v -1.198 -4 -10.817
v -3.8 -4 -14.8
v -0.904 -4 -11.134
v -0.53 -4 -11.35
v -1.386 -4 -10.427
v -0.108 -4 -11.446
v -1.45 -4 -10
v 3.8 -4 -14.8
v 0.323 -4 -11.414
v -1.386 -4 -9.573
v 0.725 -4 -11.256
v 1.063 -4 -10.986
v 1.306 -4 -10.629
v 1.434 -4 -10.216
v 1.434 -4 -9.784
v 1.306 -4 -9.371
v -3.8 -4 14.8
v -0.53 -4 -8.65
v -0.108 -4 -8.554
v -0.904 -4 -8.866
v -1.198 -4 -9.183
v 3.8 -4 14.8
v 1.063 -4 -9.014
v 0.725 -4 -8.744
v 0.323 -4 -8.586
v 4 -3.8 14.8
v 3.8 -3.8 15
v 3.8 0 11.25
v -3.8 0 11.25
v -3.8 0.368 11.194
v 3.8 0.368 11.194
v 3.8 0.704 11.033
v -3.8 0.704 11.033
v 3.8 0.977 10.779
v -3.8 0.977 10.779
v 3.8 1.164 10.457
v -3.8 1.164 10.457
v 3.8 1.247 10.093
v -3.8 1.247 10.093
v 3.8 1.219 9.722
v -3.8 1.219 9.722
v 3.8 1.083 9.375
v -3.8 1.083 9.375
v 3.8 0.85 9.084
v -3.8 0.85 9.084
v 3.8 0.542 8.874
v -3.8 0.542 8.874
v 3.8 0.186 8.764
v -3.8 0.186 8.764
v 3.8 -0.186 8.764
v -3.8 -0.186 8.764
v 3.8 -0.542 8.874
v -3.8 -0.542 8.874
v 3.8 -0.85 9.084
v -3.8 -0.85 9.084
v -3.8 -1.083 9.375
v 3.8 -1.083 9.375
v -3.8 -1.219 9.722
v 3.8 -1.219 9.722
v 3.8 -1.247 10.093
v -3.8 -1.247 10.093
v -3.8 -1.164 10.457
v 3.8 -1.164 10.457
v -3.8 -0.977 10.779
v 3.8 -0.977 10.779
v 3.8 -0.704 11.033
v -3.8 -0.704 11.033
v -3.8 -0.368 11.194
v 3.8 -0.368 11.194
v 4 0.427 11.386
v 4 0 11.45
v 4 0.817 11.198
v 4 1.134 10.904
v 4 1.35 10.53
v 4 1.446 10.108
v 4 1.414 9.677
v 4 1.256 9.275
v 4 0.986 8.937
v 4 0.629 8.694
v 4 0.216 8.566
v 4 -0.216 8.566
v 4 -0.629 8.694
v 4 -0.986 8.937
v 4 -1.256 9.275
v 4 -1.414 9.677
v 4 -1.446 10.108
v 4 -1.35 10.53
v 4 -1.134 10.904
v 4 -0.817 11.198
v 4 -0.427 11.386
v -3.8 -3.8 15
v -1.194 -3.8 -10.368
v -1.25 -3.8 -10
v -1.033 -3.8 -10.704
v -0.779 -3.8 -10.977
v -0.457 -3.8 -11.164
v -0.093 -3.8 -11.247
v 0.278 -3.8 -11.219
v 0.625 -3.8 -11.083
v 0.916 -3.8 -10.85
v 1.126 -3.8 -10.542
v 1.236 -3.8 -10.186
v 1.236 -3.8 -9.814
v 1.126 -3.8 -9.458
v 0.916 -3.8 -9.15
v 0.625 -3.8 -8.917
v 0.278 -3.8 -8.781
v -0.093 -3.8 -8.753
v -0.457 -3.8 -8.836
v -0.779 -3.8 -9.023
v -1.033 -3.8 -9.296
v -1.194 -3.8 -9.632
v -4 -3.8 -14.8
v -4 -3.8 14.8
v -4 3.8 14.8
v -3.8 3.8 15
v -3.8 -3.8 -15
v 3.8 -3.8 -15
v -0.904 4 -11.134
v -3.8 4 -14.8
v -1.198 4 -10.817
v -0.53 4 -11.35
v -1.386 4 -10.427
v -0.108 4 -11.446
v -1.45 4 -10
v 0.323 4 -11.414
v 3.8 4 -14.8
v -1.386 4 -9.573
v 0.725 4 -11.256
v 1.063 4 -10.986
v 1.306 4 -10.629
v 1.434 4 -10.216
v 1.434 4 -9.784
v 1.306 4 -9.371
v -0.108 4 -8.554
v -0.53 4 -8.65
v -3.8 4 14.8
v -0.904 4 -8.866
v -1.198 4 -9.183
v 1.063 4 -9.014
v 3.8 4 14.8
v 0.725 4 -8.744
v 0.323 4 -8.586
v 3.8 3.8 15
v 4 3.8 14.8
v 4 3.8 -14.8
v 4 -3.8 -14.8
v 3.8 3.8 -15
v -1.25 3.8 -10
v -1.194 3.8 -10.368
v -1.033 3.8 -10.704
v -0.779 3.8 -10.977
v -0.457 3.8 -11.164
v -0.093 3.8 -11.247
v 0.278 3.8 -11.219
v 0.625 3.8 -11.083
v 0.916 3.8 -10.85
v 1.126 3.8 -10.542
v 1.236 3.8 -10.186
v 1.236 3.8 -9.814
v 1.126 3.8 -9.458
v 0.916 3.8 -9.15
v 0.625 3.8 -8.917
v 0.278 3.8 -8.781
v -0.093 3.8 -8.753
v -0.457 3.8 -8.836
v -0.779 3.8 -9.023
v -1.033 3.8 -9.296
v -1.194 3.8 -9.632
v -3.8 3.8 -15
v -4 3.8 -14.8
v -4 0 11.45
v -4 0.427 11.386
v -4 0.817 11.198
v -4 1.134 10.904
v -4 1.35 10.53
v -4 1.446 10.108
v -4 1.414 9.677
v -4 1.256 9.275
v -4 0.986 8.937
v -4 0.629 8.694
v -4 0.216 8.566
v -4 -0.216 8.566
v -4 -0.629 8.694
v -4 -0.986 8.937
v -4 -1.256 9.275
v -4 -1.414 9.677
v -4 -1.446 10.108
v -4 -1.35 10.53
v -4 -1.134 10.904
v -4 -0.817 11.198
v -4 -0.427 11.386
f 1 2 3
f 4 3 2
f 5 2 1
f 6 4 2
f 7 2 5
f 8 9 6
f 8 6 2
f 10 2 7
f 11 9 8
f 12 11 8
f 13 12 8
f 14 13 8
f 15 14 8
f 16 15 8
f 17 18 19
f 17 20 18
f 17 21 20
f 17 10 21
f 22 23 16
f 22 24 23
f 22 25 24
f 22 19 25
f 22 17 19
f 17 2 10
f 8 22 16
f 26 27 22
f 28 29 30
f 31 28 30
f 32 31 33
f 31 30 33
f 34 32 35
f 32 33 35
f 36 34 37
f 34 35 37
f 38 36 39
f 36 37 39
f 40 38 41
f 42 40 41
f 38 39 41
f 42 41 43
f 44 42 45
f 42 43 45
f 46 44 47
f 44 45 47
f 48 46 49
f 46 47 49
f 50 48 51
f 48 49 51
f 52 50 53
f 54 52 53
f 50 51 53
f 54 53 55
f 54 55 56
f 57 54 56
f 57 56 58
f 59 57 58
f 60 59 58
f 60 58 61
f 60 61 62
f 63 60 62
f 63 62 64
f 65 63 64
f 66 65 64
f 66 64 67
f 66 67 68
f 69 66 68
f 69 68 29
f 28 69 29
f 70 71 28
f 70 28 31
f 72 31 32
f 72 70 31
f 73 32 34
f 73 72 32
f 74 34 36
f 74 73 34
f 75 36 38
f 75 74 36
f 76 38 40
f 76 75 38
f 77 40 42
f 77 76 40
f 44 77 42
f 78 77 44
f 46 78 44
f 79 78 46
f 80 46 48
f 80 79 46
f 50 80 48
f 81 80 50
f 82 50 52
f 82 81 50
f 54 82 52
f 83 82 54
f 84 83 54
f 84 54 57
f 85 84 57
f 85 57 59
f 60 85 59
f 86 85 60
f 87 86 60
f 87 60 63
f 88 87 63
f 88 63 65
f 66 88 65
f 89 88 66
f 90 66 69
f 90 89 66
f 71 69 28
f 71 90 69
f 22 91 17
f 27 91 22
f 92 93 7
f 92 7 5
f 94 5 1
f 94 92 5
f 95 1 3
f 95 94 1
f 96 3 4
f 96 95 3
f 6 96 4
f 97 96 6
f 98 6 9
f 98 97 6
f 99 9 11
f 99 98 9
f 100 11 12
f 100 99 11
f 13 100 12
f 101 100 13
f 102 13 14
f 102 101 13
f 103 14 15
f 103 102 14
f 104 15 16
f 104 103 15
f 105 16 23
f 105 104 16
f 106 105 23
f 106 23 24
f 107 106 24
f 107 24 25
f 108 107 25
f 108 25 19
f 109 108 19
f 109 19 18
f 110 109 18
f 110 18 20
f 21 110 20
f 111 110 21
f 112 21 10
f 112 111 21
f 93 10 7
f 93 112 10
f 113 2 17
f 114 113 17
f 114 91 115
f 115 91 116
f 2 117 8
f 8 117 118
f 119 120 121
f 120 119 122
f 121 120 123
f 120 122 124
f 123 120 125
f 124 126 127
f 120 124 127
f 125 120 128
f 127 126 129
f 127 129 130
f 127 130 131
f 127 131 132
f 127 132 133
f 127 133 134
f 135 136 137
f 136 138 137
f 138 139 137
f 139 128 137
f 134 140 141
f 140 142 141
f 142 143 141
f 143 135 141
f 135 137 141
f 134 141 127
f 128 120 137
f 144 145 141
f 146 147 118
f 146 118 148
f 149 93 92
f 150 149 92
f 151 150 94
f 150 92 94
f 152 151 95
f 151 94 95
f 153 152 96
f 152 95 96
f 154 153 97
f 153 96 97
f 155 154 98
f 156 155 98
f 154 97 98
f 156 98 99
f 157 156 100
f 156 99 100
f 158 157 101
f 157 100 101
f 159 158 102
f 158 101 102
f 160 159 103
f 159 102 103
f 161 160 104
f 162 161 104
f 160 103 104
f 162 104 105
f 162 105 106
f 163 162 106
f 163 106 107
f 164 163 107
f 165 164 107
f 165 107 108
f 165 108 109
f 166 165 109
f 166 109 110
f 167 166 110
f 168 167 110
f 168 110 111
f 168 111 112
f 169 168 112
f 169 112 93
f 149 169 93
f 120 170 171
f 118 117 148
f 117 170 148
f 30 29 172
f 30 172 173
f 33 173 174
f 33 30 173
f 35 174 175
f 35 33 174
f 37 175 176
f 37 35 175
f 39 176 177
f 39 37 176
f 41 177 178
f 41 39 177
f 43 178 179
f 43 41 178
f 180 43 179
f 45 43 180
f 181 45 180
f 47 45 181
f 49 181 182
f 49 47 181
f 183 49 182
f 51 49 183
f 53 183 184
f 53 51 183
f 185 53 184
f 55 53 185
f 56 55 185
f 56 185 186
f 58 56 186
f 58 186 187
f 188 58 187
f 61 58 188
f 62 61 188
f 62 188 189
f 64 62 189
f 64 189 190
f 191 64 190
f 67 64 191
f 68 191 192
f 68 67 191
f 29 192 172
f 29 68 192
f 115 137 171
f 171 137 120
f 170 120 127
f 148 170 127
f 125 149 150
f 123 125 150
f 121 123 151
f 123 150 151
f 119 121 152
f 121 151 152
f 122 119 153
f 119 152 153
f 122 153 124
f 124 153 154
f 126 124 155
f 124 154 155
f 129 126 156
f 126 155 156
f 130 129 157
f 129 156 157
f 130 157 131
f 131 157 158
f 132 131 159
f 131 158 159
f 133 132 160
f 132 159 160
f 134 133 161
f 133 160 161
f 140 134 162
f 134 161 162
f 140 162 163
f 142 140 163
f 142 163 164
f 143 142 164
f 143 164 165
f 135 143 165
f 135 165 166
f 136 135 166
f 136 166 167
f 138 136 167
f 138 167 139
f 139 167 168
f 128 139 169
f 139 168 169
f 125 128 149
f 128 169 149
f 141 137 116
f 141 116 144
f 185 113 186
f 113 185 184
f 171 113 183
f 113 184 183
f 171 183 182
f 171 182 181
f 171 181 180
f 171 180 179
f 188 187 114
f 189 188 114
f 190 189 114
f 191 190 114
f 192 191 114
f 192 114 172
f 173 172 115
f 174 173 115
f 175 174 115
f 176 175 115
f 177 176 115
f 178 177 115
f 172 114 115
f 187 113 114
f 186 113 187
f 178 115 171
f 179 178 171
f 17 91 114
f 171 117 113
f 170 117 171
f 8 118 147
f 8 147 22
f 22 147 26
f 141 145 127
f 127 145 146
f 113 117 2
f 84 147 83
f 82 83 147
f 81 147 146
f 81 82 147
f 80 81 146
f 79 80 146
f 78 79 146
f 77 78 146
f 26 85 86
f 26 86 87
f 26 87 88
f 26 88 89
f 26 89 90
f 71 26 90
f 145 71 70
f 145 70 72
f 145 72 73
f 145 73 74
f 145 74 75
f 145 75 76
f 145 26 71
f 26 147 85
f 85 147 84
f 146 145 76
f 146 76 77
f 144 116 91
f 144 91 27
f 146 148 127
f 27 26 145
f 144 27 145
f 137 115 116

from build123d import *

# Parameters (mm, degrees)
SKETCH_1_W         = 8
SKETCH_1_H         = 8
EXTRUDE_1_DEPTH    = 15
HOLE_WIZARD_M3_1_D = 2.5
HOLE_WIZARD_M3_2_D = 2.5
CHAMFER_1_SIZE     = 0.2


with BuildPart() as part:
    # 草图1 → 凸台-拉伸1 (new, symmetric)
    with BuildSketch(Plane.XY):
        Rectangle(SKETCH_1_W, SKETCH_1_H)
    extrude(amount=EXTRUDE_1_DEPTH, both=True)

    # M3 螺纹孔1 (through all)
    with Locations(Plane(origin=(4, 0, 0), x_dir=(0, 0, -1), z_dir=(1, 0, 0))):
        with Locations((-10, 0)):
            Hole(HOLE_WIZARD_M3_1_D / 2)

    # M3 螺纹孔2 (through all)
    with Locations(Plane(origin=(0, 4, 0), x_dir=(1, 0, 0), z_dir=(0, 1, 0))):
        with Locations((0, 10)):
            Hole(HOLE_WIZARD_M3_2_D / 2)

    # 倒角1
    chamfer_1_edges = [part.edges().sort_by_distance(p)[0] for p in [
        (-4, 0, 15),
        (4, 0, 8.75),
        (-4, 0, 8.75),
        (0, -4, 15),
        (1.25, 4, -10),
        (1.25, -4, -10),
        (4, 0, 15),
        (0, -4, -15),
        (-4, 0, -15),
        (0, 4, -15),
        (4, 0, -15),
        (4, -4, 0),
        (-4, -4, 0),
        (-4, 4, 0),
        (4, 4, 0),
        (0, 4, 15),
    ]]
    chamfer(chamfer_1_edges, length=CHAMFER_1_SIZE)


solid = part.part
